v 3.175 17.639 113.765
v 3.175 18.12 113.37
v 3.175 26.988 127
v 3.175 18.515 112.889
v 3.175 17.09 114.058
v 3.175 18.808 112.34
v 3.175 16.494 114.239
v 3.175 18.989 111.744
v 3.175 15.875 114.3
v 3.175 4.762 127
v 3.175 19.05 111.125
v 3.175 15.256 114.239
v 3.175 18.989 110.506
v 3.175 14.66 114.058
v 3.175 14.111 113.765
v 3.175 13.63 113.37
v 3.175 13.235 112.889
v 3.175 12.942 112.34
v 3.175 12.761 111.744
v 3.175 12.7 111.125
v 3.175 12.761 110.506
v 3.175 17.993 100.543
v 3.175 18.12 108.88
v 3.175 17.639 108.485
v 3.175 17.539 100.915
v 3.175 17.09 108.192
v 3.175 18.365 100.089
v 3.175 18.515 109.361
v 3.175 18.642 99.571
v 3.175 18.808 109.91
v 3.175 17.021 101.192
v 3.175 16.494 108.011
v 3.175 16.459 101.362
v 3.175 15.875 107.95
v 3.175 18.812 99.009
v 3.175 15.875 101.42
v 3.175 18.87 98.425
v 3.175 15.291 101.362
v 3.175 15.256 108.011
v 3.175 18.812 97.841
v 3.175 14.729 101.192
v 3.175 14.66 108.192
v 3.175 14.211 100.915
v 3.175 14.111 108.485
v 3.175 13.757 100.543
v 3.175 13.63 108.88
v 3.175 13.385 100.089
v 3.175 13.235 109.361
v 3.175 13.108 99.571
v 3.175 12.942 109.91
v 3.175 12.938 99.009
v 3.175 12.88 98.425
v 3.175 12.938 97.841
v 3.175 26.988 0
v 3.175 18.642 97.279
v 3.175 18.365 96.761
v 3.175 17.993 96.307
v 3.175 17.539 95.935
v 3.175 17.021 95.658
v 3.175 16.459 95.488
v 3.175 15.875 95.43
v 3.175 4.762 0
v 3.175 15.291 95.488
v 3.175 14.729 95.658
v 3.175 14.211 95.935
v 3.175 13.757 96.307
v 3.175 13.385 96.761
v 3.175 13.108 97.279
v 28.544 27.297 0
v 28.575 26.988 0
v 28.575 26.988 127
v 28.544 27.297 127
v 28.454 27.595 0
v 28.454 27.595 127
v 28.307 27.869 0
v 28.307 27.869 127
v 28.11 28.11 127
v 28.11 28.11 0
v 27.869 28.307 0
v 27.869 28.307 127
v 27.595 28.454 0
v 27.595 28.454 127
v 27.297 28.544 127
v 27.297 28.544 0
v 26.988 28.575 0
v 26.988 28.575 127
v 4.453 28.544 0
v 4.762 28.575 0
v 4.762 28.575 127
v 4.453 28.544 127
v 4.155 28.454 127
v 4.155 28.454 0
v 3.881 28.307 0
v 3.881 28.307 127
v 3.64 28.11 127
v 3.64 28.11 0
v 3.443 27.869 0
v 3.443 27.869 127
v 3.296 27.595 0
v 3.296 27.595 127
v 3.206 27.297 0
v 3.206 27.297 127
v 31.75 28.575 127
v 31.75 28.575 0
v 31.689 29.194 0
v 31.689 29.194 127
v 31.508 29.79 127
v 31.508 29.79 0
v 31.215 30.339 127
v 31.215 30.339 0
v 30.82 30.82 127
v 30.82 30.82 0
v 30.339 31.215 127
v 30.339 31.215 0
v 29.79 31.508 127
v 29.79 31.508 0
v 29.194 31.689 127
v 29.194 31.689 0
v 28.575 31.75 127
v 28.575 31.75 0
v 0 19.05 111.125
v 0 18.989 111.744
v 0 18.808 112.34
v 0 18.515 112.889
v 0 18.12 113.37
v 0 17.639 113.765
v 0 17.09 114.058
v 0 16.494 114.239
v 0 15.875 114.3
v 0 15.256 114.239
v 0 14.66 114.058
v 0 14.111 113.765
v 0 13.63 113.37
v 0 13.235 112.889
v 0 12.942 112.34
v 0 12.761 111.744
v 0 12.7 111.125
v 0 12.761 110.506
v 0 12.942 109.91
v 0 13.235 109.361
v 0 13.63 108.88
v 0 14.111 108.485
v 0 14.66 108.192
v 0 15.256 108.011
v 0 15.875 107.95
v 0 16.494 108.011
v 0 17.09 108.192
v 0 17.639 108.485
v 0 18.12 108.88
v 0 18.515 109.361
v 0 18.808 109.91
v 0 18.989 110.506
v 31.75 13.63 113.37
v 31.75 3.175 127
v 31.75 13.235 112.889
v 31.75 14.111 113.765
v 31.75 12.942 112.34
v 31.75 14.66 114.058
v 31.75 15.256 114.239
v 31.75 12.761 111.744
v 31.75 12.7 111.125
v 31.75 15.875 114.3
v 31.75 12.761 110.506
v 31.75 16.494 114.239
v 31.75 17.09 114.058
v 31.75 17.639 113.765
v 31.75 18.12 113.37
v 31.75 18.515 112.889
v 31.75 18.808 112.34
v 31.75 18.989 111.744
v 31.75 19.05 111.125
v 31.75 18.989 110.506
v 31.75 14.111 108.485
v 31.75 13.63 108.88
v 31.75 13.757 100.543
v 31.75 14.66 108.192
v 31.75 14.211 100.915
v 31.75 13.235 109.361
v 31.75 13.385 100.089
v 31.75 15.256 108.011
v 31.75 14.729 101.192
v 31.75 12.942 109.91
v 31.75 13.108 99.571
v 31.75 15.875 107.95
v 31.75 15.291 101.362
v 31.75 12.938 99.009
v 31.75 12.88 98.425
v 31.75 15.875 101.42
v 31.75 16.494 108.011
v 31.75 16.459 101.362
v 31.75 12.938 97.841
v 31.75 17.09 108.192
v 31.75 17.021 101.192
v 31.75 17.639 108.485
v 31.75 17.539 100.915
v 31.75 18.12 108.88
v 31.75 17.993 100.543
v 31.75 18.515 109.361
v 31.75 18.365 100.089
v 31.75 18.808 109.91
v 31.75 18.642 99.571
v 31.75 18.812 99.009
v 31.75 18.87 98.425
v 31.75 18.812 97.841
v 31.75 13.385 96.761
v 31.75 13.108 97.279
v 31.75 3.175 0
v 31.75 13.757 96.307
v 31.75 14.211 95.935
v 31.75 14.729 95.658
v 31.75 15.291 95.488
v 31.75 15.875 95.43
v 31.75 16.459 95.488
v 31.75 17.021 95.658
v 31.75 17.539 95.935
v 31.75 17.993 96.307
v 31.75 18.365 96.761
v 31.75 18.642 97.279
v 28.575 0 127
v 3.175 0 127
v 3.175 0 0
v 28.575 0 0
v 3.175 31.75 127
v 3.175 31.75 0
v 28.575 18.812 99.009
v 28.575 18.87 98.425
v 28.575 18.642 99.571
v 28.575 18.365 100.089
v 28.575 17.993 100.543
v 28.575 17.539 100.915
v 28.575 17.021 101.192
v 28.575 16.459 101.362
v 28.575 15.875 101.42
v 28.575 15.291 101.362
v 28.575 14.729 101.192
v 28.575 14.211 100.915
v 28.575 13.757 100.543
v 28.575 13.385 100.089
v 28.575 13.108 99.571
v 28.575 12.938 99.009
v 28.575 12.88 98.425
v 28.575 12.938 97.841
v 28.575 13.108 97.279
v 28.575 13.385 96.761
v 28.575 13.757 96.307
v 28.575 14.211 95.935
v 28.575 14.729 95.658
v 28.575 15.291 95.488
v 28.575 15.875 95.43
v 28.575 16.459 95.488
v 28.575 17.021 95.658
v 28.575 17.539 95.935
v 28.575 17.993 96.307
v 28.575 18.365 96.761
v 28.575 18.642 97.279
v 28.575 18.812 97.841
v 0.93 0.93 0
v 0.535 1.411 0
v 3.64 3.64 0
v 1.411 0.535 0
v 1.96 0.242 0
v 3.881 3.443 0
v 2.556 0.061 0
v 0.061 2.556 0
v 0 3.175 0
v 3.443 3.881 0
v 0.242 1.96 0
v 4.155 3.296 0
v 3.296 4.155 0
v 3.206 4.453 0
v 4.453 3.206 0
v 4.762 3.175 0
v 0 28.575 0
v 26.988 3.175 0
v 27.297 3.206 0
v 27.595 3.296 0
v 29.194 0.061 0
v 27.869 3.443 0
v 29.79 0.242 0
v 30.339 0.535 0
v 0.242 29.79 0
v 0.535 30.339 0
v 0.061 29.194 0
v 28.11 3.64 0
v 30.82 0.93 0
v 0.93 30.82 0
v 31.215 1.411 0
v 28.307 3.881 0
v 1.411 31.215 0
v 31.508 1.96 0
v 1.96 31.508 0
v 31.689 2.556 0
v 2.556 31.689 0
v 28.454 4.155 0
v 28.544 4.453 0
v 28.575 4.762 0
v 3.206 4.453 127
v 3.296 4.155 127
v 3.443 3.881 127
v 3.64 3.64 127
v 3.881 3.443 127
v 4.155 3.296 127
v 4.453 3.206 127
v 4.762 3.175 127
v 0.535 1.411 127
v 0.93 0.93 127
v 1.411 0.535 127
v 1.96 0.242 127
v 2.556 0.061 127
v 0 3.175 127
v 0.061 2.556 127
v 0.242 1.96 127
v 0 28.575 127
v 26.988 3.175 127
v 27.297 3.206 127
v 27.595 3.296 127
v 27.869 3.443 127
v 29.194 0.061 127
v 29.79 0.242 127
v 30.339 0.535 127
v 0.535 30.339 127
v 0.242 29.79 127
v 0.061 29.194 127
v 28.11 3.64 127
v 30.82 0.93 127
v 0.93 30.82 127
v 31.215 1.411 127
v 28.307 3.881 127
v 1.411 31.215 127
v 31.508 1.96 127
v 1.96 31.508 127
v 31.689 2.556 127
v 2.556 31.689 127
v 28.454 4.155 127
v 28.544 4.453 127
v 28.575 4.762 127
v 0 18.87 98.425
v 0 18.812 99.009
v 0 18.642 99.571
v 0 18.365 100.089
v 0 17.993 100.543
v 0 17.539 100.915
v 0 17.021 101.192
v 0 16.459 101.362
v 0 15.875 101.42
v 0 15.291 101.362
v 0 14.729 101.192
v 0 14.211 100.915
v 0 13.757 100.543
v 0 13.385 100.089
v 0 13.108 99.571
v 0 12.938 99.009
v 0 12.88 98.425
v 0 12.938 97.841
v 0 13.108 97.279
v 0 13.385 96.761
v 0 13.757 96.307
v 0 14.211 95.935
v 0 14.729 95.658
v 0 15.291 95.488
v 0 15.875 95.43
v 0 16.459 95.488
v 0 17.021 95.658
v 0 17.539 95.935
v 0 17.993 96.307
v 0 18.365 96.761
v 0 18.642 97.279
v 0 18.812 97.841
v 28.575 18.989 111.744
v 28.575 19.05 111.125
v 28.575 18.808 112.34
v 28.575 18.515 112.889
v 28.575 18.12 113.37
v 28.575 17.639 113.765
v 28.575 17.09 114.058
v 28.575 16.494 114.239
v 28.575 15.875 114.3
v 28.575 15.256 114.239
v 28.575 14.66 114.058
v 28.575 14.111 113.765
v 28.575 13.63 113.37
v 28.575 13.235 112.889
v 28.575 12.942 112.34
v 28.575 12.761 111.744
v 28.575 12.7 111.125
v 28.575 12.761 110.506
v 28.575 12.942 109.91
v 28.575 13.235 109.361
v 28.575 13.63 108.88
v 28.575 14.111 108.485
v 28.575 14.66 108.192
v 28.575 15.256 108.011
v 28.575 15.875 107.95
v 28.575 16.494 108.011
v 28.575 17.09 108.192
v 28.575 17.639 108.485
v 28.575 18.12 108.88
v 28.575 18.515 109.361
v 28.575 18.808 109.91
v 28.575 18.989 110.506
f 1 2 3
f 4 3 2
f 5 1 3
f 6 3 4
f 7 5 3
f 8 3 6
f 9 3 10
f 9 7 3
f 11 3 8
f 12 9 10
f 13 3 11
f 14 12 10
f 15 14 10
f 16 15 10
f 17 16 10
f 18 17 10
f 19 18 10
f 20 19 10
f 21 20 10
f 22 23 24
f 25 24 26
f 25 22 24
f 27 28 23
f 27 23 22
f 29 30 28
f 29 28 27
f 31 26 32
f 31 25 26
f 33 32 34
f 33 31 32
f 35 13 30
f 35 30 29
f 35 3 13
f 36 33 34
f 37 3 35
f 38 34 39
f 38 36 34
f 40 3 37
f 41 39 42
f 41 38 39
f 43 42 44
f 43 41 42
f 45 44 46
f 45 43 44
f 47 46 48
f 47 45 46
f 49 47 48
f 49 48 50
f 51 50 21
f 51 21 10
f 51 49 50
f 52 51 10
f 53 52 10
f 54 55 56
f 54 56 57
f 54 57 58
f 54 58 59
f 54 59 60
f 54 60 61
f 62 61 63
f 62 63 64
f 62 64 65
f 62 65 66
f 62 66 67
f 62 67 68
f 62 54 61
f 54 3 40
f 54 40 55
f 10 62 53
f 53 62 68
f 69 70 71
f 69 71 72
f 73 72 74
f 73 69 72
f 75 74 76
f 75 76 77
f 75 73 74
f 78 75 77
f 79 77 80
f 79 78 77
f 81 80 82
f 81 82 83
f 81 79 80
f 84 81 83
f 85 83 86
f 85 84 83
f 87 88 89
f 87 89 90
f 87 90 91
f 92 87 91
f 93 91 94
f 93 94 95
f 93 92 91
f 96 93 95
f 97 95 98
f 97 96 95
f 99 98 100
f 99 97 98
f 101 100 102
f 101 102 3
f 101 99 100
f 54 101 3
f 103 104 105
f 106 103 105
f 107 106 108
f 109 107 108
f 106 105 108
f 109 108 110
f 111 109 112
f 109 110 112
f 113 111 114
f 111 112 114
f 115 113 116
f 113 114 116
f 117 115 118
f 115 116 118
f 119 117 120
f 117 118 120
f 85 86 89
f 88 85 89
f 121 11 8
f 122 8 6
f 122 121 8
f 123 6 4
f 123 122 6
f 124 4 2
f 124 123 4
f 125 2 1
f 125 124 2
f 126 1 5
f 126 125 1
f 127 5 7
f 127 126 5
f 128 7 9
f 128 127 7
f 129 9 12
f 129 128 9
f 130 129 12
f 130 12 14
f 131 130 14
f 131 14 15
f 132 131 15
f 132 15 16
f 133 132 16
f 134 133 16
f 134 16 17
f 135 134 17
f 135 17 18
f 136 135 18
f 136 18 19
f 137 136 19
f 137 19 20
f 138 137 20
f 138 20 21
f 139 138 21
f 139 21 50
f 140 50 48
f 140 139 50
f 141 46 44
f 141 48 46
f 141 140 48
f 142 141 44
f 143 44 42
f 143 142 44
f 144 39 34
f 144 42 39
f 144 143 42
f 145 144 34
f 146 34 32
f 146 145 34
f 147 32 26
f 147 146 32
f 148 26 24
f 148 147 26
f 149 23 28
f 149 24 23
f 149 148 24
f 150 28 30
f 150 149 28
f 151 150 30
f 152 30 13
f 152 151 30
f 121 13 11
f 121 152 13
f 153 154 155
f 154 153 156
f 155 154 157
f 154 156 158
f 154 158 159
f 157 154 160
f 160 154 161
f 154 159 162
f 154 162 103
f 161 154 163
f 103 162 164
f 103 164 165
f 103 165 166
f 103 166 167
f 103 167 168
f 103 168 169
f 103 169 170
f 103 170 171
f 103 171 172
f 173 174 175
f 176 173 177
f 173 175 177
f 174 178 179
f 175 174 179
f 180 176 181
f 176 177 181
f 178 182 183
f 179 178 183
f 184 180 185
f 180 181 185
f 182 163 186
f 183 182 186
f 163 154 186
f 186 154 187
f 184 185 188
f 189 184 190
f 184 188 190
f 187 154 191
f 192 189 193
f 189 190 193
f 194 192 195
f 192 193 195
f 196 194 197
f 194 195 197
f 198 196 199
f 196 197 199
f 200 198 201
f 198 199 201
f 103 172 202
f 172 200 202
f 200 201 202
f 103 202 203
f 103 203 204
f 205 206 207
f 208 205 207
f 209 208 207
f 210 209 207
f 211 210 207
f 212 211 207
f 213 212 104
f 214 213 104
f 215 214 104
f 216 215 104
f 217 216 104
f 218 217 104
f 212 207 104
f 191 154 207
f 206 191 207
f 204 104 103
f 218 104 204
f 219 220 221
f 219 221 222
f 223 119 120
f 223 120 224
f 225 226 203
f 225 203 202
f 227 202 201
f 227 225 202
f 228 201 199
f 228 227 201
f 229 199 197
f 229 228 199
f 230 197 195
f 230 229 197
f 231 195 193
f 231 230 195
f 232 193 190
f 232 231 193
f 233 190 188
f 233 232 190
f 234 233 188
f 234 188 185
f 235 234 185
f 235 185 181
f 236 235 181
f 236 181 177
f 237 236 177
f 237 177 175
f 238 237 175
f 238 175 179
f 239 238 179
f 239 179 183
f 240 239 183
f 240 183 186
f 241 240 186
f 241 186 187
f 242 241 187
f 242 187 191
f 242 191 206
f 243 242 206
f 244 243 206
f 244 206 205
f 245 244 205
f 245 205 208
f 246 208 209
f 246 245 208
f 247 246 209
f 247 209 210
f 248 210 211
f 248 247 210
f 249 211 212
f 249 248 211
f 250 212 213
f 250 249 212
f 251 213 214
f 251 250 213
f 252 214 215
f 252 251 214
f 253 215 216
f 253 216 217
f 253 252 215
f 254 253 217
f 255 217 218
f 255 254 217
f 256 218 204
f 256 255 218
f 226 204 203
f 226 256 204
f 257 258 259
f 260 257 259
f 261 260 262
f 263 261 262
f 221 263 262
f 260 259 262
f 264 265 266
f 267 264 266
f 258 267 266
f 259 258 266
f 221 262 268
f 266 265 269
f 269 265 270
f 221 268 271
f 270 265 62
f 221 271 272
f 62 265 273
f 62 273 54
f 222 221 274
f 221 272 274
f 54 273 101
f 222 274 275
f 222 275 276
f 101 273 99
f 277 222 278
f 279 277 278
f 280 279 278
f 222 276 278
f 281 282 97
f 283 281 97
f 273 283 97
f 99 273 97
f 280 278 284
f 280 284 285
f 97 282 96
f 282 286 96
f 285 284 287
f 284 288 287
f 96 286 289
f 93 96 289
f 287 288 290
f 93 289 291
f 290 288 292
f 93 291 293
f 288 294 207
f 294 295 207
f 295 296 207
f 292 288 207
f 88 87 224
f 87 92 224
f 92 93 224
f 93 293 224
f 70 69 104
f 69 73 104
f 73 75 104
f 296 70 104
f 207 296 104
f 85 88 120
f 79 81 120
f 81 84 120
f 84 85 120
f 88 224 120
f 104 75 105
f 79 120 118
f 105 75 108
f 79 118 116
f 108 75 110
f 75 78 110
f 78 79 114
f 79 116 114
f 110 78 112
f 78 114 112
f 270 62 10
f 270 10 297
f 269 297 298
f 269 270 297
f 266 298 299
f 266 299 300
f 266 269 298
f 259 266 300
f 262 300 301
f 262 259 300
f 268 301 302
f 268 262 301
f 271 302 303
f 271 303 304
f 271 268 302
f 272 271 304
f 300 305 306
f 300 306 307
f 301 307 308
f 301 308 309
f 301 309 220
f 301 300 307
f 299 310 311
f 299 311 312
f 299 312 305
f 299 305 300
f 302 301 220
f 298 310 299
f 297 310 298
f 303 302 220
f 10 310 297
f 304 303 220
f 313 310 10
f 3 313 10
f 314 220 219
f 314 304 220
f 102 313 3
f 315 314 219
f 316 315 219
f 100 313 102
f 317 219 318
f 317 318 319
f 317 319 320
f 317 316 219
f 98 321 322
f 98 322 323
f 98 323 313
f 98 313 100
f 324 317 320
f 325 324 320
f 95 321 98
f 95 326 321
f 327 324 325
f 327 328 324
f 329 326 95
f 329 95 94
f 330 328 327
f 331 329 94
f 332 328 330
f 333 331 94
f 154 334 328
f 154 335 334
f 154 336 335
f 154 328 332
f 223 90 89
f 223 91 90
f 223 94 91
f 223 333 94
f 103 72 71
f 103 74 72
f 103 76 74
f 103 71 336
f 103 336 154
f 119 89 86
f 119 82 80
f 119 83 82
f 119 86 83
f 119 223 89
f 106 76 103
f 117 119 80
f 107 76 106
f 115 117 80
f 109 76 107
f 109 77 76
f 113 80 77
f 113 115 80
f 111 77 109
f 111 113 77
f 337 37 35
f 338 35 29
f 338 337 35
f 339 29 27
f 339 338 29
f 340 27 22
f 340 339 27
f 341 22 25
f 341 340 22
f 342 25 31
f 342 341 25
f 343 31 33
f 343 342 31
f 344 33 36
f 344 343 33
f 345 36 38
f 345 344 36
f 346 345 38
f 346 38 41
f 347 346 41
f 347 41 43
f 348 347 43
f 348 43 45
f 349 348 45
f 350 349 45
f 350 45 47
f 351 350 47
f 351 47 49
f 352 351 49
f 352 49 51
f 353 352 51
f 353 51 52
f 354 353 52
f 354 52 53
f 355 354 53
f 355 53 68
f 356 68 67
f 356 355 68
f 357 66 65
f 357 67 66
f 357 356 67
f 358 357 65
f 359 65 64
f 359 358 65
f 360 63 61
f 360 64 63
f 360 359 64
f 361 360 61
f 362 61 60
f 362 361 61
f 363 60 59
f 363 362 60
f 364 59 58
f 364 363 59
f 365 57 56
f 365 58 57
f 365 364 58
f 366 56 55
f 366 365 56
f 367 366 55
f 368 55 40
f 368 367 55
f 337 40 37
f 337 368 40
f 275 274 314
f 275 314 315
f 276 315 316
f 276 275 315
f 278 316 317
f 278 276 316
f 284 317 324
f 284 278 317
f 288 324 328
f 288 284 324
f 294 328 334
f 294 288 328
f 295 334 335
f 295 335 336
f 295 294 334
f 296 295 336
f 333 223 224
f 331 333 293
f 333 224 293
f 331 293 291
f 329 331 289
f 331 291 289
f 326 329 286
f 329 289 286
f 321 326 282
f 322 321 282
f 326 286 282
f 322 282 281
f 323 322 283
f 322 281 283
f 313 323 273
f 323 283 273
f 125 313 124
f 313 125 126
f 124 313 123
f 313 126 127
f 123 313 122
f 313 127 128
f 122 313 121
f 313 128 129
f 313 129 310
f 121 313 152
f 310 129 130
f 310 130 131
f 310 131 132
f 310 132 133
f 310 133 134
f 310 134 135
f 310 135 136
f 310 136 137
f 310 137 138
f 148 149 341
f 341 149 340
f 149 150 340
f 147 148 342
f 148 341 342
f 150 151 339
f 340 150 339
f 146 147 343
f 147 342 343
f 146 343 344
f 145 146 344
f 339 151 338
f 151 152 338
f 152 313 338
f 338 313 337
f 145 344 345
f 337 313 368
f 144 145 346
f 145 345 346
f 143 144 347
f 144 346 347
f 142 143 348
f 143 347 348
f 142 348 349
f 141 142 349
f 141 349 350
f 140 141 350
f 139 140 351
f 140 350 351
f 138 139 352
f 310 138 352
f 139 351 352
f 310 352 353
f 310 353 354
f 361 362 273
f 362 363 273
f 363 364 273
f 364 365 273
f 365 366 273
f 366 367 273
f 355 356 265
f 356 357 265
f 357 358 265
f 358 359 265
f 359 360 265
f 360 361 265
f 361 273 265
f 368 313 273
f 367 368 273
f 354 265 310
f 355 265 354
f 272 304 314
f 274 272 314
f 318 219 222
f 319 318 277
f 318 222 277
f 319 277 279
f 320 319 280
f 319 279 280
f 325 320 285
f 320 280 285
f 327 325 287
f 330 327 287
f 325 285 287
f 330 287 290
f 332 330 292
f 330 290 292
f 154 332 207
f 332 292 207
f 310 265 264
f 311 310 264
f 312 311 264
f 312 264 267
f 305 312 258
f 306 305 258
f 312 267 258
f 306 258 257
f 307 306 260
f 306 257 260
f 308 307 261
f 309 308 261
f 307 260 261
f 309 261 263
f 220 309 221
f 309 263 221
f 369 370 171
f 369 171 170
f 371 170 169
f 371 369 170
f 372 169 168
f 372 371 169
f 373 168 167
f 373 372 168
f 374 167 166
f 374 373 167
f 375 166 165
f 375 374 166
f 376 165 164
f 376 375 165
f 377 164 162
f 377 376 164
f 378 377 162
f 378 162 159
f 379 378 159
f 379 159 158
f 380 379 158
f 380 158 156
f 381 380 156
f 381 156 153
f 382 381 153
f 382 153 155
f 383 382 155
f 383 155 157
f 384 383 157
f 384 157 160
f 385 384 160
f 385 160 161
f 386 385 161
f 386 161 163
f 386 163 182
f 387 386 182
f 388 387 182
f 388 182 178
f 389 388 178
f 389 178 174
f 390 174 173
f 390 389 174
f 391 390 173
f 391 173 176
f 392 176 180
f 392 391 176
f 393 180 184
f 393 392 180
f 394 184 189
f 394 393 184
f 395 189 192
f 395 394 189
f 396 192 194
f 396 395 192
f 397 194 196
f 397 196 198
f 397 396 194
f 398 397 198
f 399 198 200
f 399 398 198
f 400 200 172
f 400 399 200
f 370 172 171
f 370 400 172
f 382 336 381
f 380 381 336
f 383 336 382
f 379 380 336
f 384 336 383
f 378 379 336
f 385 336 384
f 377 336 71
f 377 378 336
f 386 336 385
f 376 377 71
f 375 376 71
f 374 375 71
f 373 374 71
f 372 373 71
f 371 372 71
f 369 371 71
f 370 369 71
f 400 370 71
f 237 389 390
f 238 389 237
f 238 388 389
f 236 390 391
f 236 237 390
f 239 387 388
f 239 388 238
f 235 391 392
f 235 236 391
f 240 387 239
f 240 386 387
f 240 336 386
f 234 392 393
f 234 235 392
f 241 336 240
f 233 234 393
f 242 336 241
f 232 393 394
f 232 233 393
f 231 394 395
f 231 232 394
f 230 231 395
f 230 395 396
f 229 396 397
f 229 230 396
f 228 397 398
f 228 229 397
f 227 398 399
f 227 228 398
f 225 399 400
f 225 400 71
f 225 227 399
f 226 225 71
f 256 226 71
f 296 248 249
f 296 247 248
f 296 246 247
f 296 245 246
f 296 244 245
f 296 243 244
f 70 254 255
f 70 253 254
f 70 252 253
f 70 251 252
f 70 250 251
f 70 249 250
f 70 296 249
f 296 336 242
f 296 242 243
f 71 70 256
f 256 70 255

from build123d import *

# Parameters (mm, degrees)
F1_DEPTH = 127
F3_DEPTH = 127
F4_R     = 3.175
F4_R_2   = 2.994617
F5_DEPTH = 31.75


with BuildPart() as f1:
    # F0 (on Top) → F1 (new body)
    with BuildSketch(Plane.XY):
        with BuildLine():
            ThreePointArc((0, 3.175), (0.929936, 0.929936), (3.175, 0))
            Line((3.175, 0), (28.575, 0))
            ThreePointArc((28.575, 0), (30.820064, 0.929936), (31.75, 3.175))
            Line((31.75, 3.175), (31.75, 28.575))
            ThreePointArc((31.75, 28.575), (30.820064, 30.820064), (28.575, 31.75))
            Line((28.575, 31.75), (3.175, 31.75))
            ThreePointArc((3.175, 31.75), (0.929936, 30.820064), (0, 28.575))
            Line((0, 28.575), (0, 3.175))
        make_face()
    extrude(amount=F1_DEPTH)

    # F2 (on Top) → F3 (cut)
    with BuildSketch(Plane.XY):
        with BuildLine():
            ThreePointArc((3.175, 4.7625), (3.639968, 3.639968), (4.7625, 3.175))
            Line((4.7625, 3.175), (26.9875, 3.175))
            ThreePointArc((26.9875, 3.175), (28.110032, 3.639968), (28.575, 4.7625))
            Line((28.575, 4.7625), (28.575, 26.9875))
            ThreePointArc((28.575, 26.9875), (28.110032, 28.110032), (26.9875, 28.575))
            Line((26.9875, 28.575), (4.7625, 28.575))
            ThreePointArc((4.7625, 28.575), (3.639968, 28.110032), (3.175, 26.9875))
            Line((3.175, 26.9875), (3.175, 4.7625))
        make_face()
    extrude(amount=F3_DEPTH, mode=Mode.SUBTRACT)

    # F4 (on Right) → F5 (cut)
    with BuildSketch(Plane.YZ):
        with Locations((15.875, 111.125)):
            Circle(F4_R)
        with Locations((15.875, 98.425)):
            Circle(F4_R_2)
    extrude(amount=F5_DEPTH, mode=Mode.SUBTRACT)


solid = f1.part
